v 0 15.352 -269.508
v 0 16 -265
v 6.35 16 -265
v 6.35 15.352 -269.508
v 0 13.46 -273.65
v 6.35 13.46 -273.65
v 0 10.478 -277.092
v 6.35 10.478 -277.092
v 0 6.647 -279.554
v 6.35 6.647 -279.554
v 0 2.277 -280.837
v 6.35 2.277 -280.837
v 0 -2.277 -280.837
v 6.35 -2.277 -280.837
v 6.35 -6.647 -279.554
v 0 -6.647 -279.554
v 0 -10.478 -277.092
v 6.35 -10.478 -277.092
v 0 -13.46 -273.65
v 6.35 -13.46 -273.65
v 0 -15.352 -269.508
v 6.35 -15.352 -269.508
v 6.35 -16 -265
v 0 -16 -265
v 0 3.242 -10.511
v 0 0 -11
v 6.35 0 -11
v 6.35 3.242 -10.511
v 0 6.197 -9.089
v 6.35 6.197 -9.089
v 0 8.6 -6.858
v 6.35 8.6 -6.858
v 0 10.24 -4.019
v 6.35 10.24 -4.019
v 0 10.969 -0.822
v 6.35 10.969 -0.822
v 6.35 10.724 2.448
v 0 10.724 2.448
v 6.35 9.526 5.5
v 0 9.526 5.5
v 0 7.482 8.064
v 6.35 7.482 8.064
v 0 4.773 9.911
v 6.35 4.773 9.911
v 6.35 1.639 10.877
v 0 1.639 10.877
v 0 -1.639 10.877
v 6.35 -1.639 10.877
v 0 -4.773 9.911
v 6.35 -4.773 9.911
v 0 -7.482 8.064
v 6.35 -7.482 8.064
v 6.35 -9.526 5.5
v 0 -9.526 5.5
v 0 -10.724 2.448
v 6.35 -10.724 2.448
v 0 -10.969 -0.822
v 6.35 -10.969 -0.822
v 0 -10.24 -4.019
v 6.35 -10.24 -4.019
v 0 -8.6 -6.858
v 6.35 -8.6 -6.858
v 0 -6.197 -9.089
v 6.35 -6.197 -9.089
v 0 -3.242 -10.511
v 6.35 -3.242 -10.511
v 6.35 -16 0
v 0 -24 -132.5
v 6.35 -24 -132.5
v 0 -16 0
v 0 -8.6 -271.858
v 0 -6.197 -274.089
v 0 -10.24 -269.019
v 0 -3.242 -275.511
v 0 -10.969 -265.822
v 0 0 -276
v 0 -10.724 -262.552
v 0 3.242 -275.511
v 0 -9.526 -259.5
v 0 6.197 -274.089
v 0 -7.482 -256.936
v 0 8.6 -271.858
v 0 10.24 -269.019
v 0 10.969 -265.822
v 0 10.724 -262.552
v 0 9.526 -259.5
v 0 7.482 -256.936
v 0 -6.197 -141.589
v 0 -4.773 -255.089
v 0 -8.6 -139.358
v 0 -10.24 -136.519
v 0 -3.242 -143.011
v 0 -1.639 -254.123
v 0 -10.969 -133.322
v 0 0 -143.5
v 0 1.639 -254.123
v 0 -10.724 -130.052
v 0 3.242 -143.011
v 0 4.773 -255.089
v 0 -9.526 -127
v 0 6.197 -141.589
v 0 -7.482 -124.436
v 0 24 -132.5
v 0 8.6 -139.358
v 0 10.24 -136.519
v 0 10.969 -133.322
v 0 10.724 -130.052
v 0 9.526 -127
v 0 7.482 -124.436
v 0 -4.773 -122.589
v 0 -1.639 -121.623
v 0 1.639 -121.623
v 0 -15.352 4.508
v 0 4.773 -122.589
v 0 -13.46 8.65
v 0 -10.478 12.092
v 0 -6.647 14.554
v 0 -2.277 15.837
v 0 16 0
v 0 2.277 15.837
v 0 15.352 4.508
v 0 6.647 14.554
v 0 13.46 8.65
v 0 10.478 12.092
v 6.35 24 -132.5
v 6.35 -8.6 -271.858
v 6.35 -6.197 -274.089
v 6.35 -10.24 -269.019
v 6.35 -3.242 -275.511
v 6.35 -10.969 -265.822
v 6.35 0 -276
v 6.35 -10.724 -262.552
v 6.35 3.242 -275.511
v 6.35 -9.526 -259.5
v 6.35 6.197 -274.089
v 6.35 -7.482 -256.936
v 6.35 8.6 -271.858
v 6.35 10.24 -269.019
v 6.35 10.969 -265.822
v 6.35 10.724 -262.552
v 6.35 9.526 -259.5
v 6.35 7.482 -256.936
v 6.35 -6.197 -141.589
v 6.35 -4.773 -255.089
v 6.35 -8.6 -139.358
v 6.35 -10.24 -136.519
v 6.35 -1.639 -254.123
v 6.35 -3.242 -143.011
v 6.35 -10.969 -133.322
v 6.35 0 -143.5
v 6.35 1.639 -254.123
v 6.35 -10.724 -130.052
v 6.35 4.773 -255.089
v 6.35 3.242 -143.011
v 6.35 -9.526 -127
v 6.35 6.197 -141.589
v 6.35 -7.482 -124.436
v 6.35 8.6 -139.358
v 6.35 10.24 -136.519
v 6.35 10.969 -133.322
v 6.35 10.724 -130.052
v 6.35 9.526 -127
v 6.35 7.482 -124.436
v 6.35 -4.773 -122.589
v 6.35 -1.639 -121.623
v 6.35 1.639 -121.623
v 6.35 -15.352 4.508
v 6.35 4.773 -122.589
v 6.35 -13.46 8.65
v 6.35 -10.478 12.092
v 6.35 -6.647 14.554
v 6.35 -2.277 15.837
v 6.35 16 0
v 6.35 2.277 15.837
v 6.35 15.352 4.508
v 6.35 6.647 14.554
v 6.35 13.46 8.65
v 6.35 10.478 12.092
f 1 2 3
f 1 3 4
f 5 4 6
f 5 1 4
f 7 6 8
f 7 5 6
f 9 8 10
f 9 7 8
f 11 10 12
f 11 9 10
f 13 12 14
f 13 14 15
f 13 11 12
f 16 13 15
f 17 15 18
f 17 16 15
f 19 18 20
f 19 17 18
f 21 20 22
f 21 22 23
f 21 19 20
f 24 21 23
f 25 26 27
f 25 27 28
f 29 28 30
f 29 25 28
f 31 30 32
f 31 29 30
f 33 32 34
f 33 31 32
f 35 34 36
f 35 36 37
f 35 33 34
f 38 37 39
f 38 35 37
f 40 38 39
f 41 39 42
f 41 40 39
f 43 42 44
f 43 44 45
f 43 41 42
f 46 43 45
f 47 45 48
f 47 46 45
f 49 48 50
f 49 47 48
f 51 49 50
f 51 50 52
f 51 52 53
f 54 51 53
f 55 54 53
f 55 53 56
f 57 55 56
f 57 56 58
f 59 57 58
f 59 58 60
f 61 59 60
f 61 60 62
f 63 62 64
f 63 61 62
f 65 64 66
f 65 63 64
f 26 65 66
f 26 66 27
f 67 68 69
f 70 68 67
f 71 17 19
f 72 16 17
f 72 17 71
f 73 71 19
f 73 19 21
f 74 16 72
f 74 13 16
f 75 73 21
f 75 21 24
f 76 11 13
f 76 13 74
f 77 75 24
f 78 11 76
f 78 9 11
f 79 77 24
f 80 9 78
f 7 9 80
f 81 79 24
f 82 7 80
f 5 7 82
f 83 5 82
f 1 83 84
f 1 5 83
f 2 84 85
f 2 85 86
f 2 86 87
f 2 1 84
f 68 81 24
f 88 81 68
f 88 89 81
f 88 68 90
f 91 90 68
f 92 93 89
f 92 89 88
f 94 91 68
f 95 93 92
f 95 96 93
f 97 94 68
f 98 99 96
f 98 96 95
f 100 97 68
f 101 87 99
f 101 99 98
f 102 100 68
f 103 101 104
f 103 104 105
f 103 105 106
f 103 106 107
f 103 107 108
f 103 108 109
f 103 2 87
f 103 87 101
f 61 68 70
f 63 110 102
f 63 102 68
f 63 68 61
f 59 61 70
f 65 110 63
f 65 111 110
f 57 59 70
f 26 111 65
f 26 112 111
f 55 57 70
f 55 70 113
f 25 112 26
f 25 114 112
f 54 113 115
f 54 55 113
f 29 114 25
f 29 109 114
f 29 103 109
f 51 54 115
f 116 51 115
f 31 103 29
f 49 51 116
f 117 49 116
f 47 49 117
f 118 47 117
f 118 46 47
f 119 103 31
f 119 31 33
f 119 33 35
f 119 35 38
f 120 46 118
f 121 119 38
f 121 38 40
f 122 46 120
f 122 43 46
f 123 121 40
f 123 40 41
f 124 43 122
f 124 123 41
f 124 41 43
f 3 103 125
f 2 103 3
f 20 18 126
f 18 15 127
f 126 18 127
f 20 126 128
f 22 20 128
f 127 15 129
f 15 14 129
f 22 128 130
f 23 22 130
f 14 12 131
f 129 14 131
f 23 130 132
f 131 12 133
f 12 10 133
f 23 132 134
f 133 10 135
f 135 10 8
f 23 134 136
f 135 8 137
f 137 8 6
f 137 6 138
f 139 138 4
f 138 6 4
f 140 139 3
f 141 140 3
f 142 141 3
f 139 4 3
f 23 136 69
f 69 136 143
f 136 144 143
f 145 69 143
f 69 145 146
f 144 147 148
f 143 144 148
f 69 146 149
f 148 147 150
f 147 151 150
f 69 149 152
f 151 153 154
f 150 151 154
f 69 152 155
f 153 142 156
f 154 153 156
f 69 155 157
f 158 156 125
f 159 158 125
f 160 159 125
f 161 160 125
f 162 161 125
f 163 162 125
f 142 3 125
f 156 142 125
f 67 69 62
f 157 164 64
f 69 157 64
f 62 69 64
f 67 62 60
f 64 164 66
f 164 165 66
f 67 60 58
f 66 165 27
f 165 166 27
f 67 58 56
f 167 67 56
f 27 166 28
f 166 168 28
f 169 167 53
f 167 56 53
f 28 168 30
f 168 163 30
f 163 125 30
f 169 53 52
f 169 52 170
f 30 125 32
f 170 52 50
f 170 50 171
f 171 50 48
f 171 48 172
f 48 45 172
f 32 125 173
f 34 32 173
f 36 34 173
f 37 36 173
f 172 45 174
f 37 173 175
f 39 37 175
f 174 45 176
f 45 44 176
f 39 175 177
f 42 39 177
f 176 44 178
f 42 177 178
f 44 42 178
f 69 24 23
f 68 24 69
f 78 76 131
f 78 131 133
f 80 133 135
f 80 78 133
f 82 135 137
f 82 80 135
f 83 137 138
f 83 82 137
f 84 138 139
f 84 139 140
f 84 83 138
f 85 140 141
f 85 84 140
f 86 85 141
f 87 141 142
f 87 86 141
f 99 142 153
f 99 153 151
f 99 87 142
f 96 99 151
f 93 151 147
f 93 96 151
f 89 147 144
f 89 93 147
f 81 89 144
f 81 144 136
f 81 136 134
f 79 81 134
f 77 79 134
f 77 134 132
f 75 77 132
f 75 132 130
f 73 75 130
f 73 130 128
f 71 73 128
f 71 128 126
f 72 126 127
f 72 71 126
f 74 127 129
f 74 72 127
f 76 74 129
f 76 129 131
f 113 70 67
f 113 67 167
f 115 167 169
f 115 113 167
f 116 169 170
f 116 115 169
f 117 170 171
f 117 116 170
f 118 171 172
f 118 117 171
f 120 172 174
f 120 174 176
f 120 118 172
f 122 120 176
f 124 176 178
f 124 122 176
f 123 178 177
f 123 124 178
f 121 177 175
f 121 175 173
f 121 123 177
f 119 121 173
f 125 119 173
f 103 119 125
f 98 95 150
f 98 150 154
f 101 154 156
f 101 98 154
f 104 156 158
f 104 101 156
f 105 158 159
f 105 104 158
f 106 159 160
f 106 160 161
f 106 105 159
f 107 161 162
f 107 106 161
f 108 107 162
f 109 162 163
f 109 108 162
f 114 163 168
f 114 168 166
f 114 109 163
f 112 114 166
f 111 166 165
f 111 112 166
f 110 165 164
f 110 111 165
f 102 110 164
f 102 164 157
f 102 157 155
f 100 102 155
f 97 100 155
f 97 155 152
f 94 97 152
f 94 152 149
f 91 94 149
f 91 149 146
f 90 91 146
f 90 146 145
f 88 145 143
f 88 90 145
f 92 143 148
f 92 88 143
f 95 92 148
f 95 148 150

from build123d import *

# Parameters (mm, degrees)
SKETCH1_R           = 11
BOSS_EXTRUDE1_DEPTH = 6.35


with BuildPart() as part:
    # Sketch1 → Boss-Extrude1 (new body)
    with BuildSketch(Plane(origin=(0, 0, 0), x_dir=(0, 0, -1), z_dir=(1, 0, 0))):
        with BuildLine():
            Line((0, 16), (132.5, 24))
            Line((132.5, 24), (265, 16))
            ThreePointArc((265, 16), (281, 0), (265, -16))
            Line((265, -16), (132.5, -24))
            Line((132.5, -24), (0, -16))
            ThreePointArc((0, -16), (-16, 0), (0, 16))
        make_face()
        Circle(SKETCH1_R, mode=Mode.SUBTRACT)
        with Locations((265, 0)):
            Circle(SKETCH1_R, mode=Mode.SUBTRACT)
        with Locations((132.5, 0)):
            Circle(SKETCH1_R, mode=Mode.SUBTRACT)
    extrude(amount=BOSS_EXTRUDE1_DEPTH)


solid = part.part
